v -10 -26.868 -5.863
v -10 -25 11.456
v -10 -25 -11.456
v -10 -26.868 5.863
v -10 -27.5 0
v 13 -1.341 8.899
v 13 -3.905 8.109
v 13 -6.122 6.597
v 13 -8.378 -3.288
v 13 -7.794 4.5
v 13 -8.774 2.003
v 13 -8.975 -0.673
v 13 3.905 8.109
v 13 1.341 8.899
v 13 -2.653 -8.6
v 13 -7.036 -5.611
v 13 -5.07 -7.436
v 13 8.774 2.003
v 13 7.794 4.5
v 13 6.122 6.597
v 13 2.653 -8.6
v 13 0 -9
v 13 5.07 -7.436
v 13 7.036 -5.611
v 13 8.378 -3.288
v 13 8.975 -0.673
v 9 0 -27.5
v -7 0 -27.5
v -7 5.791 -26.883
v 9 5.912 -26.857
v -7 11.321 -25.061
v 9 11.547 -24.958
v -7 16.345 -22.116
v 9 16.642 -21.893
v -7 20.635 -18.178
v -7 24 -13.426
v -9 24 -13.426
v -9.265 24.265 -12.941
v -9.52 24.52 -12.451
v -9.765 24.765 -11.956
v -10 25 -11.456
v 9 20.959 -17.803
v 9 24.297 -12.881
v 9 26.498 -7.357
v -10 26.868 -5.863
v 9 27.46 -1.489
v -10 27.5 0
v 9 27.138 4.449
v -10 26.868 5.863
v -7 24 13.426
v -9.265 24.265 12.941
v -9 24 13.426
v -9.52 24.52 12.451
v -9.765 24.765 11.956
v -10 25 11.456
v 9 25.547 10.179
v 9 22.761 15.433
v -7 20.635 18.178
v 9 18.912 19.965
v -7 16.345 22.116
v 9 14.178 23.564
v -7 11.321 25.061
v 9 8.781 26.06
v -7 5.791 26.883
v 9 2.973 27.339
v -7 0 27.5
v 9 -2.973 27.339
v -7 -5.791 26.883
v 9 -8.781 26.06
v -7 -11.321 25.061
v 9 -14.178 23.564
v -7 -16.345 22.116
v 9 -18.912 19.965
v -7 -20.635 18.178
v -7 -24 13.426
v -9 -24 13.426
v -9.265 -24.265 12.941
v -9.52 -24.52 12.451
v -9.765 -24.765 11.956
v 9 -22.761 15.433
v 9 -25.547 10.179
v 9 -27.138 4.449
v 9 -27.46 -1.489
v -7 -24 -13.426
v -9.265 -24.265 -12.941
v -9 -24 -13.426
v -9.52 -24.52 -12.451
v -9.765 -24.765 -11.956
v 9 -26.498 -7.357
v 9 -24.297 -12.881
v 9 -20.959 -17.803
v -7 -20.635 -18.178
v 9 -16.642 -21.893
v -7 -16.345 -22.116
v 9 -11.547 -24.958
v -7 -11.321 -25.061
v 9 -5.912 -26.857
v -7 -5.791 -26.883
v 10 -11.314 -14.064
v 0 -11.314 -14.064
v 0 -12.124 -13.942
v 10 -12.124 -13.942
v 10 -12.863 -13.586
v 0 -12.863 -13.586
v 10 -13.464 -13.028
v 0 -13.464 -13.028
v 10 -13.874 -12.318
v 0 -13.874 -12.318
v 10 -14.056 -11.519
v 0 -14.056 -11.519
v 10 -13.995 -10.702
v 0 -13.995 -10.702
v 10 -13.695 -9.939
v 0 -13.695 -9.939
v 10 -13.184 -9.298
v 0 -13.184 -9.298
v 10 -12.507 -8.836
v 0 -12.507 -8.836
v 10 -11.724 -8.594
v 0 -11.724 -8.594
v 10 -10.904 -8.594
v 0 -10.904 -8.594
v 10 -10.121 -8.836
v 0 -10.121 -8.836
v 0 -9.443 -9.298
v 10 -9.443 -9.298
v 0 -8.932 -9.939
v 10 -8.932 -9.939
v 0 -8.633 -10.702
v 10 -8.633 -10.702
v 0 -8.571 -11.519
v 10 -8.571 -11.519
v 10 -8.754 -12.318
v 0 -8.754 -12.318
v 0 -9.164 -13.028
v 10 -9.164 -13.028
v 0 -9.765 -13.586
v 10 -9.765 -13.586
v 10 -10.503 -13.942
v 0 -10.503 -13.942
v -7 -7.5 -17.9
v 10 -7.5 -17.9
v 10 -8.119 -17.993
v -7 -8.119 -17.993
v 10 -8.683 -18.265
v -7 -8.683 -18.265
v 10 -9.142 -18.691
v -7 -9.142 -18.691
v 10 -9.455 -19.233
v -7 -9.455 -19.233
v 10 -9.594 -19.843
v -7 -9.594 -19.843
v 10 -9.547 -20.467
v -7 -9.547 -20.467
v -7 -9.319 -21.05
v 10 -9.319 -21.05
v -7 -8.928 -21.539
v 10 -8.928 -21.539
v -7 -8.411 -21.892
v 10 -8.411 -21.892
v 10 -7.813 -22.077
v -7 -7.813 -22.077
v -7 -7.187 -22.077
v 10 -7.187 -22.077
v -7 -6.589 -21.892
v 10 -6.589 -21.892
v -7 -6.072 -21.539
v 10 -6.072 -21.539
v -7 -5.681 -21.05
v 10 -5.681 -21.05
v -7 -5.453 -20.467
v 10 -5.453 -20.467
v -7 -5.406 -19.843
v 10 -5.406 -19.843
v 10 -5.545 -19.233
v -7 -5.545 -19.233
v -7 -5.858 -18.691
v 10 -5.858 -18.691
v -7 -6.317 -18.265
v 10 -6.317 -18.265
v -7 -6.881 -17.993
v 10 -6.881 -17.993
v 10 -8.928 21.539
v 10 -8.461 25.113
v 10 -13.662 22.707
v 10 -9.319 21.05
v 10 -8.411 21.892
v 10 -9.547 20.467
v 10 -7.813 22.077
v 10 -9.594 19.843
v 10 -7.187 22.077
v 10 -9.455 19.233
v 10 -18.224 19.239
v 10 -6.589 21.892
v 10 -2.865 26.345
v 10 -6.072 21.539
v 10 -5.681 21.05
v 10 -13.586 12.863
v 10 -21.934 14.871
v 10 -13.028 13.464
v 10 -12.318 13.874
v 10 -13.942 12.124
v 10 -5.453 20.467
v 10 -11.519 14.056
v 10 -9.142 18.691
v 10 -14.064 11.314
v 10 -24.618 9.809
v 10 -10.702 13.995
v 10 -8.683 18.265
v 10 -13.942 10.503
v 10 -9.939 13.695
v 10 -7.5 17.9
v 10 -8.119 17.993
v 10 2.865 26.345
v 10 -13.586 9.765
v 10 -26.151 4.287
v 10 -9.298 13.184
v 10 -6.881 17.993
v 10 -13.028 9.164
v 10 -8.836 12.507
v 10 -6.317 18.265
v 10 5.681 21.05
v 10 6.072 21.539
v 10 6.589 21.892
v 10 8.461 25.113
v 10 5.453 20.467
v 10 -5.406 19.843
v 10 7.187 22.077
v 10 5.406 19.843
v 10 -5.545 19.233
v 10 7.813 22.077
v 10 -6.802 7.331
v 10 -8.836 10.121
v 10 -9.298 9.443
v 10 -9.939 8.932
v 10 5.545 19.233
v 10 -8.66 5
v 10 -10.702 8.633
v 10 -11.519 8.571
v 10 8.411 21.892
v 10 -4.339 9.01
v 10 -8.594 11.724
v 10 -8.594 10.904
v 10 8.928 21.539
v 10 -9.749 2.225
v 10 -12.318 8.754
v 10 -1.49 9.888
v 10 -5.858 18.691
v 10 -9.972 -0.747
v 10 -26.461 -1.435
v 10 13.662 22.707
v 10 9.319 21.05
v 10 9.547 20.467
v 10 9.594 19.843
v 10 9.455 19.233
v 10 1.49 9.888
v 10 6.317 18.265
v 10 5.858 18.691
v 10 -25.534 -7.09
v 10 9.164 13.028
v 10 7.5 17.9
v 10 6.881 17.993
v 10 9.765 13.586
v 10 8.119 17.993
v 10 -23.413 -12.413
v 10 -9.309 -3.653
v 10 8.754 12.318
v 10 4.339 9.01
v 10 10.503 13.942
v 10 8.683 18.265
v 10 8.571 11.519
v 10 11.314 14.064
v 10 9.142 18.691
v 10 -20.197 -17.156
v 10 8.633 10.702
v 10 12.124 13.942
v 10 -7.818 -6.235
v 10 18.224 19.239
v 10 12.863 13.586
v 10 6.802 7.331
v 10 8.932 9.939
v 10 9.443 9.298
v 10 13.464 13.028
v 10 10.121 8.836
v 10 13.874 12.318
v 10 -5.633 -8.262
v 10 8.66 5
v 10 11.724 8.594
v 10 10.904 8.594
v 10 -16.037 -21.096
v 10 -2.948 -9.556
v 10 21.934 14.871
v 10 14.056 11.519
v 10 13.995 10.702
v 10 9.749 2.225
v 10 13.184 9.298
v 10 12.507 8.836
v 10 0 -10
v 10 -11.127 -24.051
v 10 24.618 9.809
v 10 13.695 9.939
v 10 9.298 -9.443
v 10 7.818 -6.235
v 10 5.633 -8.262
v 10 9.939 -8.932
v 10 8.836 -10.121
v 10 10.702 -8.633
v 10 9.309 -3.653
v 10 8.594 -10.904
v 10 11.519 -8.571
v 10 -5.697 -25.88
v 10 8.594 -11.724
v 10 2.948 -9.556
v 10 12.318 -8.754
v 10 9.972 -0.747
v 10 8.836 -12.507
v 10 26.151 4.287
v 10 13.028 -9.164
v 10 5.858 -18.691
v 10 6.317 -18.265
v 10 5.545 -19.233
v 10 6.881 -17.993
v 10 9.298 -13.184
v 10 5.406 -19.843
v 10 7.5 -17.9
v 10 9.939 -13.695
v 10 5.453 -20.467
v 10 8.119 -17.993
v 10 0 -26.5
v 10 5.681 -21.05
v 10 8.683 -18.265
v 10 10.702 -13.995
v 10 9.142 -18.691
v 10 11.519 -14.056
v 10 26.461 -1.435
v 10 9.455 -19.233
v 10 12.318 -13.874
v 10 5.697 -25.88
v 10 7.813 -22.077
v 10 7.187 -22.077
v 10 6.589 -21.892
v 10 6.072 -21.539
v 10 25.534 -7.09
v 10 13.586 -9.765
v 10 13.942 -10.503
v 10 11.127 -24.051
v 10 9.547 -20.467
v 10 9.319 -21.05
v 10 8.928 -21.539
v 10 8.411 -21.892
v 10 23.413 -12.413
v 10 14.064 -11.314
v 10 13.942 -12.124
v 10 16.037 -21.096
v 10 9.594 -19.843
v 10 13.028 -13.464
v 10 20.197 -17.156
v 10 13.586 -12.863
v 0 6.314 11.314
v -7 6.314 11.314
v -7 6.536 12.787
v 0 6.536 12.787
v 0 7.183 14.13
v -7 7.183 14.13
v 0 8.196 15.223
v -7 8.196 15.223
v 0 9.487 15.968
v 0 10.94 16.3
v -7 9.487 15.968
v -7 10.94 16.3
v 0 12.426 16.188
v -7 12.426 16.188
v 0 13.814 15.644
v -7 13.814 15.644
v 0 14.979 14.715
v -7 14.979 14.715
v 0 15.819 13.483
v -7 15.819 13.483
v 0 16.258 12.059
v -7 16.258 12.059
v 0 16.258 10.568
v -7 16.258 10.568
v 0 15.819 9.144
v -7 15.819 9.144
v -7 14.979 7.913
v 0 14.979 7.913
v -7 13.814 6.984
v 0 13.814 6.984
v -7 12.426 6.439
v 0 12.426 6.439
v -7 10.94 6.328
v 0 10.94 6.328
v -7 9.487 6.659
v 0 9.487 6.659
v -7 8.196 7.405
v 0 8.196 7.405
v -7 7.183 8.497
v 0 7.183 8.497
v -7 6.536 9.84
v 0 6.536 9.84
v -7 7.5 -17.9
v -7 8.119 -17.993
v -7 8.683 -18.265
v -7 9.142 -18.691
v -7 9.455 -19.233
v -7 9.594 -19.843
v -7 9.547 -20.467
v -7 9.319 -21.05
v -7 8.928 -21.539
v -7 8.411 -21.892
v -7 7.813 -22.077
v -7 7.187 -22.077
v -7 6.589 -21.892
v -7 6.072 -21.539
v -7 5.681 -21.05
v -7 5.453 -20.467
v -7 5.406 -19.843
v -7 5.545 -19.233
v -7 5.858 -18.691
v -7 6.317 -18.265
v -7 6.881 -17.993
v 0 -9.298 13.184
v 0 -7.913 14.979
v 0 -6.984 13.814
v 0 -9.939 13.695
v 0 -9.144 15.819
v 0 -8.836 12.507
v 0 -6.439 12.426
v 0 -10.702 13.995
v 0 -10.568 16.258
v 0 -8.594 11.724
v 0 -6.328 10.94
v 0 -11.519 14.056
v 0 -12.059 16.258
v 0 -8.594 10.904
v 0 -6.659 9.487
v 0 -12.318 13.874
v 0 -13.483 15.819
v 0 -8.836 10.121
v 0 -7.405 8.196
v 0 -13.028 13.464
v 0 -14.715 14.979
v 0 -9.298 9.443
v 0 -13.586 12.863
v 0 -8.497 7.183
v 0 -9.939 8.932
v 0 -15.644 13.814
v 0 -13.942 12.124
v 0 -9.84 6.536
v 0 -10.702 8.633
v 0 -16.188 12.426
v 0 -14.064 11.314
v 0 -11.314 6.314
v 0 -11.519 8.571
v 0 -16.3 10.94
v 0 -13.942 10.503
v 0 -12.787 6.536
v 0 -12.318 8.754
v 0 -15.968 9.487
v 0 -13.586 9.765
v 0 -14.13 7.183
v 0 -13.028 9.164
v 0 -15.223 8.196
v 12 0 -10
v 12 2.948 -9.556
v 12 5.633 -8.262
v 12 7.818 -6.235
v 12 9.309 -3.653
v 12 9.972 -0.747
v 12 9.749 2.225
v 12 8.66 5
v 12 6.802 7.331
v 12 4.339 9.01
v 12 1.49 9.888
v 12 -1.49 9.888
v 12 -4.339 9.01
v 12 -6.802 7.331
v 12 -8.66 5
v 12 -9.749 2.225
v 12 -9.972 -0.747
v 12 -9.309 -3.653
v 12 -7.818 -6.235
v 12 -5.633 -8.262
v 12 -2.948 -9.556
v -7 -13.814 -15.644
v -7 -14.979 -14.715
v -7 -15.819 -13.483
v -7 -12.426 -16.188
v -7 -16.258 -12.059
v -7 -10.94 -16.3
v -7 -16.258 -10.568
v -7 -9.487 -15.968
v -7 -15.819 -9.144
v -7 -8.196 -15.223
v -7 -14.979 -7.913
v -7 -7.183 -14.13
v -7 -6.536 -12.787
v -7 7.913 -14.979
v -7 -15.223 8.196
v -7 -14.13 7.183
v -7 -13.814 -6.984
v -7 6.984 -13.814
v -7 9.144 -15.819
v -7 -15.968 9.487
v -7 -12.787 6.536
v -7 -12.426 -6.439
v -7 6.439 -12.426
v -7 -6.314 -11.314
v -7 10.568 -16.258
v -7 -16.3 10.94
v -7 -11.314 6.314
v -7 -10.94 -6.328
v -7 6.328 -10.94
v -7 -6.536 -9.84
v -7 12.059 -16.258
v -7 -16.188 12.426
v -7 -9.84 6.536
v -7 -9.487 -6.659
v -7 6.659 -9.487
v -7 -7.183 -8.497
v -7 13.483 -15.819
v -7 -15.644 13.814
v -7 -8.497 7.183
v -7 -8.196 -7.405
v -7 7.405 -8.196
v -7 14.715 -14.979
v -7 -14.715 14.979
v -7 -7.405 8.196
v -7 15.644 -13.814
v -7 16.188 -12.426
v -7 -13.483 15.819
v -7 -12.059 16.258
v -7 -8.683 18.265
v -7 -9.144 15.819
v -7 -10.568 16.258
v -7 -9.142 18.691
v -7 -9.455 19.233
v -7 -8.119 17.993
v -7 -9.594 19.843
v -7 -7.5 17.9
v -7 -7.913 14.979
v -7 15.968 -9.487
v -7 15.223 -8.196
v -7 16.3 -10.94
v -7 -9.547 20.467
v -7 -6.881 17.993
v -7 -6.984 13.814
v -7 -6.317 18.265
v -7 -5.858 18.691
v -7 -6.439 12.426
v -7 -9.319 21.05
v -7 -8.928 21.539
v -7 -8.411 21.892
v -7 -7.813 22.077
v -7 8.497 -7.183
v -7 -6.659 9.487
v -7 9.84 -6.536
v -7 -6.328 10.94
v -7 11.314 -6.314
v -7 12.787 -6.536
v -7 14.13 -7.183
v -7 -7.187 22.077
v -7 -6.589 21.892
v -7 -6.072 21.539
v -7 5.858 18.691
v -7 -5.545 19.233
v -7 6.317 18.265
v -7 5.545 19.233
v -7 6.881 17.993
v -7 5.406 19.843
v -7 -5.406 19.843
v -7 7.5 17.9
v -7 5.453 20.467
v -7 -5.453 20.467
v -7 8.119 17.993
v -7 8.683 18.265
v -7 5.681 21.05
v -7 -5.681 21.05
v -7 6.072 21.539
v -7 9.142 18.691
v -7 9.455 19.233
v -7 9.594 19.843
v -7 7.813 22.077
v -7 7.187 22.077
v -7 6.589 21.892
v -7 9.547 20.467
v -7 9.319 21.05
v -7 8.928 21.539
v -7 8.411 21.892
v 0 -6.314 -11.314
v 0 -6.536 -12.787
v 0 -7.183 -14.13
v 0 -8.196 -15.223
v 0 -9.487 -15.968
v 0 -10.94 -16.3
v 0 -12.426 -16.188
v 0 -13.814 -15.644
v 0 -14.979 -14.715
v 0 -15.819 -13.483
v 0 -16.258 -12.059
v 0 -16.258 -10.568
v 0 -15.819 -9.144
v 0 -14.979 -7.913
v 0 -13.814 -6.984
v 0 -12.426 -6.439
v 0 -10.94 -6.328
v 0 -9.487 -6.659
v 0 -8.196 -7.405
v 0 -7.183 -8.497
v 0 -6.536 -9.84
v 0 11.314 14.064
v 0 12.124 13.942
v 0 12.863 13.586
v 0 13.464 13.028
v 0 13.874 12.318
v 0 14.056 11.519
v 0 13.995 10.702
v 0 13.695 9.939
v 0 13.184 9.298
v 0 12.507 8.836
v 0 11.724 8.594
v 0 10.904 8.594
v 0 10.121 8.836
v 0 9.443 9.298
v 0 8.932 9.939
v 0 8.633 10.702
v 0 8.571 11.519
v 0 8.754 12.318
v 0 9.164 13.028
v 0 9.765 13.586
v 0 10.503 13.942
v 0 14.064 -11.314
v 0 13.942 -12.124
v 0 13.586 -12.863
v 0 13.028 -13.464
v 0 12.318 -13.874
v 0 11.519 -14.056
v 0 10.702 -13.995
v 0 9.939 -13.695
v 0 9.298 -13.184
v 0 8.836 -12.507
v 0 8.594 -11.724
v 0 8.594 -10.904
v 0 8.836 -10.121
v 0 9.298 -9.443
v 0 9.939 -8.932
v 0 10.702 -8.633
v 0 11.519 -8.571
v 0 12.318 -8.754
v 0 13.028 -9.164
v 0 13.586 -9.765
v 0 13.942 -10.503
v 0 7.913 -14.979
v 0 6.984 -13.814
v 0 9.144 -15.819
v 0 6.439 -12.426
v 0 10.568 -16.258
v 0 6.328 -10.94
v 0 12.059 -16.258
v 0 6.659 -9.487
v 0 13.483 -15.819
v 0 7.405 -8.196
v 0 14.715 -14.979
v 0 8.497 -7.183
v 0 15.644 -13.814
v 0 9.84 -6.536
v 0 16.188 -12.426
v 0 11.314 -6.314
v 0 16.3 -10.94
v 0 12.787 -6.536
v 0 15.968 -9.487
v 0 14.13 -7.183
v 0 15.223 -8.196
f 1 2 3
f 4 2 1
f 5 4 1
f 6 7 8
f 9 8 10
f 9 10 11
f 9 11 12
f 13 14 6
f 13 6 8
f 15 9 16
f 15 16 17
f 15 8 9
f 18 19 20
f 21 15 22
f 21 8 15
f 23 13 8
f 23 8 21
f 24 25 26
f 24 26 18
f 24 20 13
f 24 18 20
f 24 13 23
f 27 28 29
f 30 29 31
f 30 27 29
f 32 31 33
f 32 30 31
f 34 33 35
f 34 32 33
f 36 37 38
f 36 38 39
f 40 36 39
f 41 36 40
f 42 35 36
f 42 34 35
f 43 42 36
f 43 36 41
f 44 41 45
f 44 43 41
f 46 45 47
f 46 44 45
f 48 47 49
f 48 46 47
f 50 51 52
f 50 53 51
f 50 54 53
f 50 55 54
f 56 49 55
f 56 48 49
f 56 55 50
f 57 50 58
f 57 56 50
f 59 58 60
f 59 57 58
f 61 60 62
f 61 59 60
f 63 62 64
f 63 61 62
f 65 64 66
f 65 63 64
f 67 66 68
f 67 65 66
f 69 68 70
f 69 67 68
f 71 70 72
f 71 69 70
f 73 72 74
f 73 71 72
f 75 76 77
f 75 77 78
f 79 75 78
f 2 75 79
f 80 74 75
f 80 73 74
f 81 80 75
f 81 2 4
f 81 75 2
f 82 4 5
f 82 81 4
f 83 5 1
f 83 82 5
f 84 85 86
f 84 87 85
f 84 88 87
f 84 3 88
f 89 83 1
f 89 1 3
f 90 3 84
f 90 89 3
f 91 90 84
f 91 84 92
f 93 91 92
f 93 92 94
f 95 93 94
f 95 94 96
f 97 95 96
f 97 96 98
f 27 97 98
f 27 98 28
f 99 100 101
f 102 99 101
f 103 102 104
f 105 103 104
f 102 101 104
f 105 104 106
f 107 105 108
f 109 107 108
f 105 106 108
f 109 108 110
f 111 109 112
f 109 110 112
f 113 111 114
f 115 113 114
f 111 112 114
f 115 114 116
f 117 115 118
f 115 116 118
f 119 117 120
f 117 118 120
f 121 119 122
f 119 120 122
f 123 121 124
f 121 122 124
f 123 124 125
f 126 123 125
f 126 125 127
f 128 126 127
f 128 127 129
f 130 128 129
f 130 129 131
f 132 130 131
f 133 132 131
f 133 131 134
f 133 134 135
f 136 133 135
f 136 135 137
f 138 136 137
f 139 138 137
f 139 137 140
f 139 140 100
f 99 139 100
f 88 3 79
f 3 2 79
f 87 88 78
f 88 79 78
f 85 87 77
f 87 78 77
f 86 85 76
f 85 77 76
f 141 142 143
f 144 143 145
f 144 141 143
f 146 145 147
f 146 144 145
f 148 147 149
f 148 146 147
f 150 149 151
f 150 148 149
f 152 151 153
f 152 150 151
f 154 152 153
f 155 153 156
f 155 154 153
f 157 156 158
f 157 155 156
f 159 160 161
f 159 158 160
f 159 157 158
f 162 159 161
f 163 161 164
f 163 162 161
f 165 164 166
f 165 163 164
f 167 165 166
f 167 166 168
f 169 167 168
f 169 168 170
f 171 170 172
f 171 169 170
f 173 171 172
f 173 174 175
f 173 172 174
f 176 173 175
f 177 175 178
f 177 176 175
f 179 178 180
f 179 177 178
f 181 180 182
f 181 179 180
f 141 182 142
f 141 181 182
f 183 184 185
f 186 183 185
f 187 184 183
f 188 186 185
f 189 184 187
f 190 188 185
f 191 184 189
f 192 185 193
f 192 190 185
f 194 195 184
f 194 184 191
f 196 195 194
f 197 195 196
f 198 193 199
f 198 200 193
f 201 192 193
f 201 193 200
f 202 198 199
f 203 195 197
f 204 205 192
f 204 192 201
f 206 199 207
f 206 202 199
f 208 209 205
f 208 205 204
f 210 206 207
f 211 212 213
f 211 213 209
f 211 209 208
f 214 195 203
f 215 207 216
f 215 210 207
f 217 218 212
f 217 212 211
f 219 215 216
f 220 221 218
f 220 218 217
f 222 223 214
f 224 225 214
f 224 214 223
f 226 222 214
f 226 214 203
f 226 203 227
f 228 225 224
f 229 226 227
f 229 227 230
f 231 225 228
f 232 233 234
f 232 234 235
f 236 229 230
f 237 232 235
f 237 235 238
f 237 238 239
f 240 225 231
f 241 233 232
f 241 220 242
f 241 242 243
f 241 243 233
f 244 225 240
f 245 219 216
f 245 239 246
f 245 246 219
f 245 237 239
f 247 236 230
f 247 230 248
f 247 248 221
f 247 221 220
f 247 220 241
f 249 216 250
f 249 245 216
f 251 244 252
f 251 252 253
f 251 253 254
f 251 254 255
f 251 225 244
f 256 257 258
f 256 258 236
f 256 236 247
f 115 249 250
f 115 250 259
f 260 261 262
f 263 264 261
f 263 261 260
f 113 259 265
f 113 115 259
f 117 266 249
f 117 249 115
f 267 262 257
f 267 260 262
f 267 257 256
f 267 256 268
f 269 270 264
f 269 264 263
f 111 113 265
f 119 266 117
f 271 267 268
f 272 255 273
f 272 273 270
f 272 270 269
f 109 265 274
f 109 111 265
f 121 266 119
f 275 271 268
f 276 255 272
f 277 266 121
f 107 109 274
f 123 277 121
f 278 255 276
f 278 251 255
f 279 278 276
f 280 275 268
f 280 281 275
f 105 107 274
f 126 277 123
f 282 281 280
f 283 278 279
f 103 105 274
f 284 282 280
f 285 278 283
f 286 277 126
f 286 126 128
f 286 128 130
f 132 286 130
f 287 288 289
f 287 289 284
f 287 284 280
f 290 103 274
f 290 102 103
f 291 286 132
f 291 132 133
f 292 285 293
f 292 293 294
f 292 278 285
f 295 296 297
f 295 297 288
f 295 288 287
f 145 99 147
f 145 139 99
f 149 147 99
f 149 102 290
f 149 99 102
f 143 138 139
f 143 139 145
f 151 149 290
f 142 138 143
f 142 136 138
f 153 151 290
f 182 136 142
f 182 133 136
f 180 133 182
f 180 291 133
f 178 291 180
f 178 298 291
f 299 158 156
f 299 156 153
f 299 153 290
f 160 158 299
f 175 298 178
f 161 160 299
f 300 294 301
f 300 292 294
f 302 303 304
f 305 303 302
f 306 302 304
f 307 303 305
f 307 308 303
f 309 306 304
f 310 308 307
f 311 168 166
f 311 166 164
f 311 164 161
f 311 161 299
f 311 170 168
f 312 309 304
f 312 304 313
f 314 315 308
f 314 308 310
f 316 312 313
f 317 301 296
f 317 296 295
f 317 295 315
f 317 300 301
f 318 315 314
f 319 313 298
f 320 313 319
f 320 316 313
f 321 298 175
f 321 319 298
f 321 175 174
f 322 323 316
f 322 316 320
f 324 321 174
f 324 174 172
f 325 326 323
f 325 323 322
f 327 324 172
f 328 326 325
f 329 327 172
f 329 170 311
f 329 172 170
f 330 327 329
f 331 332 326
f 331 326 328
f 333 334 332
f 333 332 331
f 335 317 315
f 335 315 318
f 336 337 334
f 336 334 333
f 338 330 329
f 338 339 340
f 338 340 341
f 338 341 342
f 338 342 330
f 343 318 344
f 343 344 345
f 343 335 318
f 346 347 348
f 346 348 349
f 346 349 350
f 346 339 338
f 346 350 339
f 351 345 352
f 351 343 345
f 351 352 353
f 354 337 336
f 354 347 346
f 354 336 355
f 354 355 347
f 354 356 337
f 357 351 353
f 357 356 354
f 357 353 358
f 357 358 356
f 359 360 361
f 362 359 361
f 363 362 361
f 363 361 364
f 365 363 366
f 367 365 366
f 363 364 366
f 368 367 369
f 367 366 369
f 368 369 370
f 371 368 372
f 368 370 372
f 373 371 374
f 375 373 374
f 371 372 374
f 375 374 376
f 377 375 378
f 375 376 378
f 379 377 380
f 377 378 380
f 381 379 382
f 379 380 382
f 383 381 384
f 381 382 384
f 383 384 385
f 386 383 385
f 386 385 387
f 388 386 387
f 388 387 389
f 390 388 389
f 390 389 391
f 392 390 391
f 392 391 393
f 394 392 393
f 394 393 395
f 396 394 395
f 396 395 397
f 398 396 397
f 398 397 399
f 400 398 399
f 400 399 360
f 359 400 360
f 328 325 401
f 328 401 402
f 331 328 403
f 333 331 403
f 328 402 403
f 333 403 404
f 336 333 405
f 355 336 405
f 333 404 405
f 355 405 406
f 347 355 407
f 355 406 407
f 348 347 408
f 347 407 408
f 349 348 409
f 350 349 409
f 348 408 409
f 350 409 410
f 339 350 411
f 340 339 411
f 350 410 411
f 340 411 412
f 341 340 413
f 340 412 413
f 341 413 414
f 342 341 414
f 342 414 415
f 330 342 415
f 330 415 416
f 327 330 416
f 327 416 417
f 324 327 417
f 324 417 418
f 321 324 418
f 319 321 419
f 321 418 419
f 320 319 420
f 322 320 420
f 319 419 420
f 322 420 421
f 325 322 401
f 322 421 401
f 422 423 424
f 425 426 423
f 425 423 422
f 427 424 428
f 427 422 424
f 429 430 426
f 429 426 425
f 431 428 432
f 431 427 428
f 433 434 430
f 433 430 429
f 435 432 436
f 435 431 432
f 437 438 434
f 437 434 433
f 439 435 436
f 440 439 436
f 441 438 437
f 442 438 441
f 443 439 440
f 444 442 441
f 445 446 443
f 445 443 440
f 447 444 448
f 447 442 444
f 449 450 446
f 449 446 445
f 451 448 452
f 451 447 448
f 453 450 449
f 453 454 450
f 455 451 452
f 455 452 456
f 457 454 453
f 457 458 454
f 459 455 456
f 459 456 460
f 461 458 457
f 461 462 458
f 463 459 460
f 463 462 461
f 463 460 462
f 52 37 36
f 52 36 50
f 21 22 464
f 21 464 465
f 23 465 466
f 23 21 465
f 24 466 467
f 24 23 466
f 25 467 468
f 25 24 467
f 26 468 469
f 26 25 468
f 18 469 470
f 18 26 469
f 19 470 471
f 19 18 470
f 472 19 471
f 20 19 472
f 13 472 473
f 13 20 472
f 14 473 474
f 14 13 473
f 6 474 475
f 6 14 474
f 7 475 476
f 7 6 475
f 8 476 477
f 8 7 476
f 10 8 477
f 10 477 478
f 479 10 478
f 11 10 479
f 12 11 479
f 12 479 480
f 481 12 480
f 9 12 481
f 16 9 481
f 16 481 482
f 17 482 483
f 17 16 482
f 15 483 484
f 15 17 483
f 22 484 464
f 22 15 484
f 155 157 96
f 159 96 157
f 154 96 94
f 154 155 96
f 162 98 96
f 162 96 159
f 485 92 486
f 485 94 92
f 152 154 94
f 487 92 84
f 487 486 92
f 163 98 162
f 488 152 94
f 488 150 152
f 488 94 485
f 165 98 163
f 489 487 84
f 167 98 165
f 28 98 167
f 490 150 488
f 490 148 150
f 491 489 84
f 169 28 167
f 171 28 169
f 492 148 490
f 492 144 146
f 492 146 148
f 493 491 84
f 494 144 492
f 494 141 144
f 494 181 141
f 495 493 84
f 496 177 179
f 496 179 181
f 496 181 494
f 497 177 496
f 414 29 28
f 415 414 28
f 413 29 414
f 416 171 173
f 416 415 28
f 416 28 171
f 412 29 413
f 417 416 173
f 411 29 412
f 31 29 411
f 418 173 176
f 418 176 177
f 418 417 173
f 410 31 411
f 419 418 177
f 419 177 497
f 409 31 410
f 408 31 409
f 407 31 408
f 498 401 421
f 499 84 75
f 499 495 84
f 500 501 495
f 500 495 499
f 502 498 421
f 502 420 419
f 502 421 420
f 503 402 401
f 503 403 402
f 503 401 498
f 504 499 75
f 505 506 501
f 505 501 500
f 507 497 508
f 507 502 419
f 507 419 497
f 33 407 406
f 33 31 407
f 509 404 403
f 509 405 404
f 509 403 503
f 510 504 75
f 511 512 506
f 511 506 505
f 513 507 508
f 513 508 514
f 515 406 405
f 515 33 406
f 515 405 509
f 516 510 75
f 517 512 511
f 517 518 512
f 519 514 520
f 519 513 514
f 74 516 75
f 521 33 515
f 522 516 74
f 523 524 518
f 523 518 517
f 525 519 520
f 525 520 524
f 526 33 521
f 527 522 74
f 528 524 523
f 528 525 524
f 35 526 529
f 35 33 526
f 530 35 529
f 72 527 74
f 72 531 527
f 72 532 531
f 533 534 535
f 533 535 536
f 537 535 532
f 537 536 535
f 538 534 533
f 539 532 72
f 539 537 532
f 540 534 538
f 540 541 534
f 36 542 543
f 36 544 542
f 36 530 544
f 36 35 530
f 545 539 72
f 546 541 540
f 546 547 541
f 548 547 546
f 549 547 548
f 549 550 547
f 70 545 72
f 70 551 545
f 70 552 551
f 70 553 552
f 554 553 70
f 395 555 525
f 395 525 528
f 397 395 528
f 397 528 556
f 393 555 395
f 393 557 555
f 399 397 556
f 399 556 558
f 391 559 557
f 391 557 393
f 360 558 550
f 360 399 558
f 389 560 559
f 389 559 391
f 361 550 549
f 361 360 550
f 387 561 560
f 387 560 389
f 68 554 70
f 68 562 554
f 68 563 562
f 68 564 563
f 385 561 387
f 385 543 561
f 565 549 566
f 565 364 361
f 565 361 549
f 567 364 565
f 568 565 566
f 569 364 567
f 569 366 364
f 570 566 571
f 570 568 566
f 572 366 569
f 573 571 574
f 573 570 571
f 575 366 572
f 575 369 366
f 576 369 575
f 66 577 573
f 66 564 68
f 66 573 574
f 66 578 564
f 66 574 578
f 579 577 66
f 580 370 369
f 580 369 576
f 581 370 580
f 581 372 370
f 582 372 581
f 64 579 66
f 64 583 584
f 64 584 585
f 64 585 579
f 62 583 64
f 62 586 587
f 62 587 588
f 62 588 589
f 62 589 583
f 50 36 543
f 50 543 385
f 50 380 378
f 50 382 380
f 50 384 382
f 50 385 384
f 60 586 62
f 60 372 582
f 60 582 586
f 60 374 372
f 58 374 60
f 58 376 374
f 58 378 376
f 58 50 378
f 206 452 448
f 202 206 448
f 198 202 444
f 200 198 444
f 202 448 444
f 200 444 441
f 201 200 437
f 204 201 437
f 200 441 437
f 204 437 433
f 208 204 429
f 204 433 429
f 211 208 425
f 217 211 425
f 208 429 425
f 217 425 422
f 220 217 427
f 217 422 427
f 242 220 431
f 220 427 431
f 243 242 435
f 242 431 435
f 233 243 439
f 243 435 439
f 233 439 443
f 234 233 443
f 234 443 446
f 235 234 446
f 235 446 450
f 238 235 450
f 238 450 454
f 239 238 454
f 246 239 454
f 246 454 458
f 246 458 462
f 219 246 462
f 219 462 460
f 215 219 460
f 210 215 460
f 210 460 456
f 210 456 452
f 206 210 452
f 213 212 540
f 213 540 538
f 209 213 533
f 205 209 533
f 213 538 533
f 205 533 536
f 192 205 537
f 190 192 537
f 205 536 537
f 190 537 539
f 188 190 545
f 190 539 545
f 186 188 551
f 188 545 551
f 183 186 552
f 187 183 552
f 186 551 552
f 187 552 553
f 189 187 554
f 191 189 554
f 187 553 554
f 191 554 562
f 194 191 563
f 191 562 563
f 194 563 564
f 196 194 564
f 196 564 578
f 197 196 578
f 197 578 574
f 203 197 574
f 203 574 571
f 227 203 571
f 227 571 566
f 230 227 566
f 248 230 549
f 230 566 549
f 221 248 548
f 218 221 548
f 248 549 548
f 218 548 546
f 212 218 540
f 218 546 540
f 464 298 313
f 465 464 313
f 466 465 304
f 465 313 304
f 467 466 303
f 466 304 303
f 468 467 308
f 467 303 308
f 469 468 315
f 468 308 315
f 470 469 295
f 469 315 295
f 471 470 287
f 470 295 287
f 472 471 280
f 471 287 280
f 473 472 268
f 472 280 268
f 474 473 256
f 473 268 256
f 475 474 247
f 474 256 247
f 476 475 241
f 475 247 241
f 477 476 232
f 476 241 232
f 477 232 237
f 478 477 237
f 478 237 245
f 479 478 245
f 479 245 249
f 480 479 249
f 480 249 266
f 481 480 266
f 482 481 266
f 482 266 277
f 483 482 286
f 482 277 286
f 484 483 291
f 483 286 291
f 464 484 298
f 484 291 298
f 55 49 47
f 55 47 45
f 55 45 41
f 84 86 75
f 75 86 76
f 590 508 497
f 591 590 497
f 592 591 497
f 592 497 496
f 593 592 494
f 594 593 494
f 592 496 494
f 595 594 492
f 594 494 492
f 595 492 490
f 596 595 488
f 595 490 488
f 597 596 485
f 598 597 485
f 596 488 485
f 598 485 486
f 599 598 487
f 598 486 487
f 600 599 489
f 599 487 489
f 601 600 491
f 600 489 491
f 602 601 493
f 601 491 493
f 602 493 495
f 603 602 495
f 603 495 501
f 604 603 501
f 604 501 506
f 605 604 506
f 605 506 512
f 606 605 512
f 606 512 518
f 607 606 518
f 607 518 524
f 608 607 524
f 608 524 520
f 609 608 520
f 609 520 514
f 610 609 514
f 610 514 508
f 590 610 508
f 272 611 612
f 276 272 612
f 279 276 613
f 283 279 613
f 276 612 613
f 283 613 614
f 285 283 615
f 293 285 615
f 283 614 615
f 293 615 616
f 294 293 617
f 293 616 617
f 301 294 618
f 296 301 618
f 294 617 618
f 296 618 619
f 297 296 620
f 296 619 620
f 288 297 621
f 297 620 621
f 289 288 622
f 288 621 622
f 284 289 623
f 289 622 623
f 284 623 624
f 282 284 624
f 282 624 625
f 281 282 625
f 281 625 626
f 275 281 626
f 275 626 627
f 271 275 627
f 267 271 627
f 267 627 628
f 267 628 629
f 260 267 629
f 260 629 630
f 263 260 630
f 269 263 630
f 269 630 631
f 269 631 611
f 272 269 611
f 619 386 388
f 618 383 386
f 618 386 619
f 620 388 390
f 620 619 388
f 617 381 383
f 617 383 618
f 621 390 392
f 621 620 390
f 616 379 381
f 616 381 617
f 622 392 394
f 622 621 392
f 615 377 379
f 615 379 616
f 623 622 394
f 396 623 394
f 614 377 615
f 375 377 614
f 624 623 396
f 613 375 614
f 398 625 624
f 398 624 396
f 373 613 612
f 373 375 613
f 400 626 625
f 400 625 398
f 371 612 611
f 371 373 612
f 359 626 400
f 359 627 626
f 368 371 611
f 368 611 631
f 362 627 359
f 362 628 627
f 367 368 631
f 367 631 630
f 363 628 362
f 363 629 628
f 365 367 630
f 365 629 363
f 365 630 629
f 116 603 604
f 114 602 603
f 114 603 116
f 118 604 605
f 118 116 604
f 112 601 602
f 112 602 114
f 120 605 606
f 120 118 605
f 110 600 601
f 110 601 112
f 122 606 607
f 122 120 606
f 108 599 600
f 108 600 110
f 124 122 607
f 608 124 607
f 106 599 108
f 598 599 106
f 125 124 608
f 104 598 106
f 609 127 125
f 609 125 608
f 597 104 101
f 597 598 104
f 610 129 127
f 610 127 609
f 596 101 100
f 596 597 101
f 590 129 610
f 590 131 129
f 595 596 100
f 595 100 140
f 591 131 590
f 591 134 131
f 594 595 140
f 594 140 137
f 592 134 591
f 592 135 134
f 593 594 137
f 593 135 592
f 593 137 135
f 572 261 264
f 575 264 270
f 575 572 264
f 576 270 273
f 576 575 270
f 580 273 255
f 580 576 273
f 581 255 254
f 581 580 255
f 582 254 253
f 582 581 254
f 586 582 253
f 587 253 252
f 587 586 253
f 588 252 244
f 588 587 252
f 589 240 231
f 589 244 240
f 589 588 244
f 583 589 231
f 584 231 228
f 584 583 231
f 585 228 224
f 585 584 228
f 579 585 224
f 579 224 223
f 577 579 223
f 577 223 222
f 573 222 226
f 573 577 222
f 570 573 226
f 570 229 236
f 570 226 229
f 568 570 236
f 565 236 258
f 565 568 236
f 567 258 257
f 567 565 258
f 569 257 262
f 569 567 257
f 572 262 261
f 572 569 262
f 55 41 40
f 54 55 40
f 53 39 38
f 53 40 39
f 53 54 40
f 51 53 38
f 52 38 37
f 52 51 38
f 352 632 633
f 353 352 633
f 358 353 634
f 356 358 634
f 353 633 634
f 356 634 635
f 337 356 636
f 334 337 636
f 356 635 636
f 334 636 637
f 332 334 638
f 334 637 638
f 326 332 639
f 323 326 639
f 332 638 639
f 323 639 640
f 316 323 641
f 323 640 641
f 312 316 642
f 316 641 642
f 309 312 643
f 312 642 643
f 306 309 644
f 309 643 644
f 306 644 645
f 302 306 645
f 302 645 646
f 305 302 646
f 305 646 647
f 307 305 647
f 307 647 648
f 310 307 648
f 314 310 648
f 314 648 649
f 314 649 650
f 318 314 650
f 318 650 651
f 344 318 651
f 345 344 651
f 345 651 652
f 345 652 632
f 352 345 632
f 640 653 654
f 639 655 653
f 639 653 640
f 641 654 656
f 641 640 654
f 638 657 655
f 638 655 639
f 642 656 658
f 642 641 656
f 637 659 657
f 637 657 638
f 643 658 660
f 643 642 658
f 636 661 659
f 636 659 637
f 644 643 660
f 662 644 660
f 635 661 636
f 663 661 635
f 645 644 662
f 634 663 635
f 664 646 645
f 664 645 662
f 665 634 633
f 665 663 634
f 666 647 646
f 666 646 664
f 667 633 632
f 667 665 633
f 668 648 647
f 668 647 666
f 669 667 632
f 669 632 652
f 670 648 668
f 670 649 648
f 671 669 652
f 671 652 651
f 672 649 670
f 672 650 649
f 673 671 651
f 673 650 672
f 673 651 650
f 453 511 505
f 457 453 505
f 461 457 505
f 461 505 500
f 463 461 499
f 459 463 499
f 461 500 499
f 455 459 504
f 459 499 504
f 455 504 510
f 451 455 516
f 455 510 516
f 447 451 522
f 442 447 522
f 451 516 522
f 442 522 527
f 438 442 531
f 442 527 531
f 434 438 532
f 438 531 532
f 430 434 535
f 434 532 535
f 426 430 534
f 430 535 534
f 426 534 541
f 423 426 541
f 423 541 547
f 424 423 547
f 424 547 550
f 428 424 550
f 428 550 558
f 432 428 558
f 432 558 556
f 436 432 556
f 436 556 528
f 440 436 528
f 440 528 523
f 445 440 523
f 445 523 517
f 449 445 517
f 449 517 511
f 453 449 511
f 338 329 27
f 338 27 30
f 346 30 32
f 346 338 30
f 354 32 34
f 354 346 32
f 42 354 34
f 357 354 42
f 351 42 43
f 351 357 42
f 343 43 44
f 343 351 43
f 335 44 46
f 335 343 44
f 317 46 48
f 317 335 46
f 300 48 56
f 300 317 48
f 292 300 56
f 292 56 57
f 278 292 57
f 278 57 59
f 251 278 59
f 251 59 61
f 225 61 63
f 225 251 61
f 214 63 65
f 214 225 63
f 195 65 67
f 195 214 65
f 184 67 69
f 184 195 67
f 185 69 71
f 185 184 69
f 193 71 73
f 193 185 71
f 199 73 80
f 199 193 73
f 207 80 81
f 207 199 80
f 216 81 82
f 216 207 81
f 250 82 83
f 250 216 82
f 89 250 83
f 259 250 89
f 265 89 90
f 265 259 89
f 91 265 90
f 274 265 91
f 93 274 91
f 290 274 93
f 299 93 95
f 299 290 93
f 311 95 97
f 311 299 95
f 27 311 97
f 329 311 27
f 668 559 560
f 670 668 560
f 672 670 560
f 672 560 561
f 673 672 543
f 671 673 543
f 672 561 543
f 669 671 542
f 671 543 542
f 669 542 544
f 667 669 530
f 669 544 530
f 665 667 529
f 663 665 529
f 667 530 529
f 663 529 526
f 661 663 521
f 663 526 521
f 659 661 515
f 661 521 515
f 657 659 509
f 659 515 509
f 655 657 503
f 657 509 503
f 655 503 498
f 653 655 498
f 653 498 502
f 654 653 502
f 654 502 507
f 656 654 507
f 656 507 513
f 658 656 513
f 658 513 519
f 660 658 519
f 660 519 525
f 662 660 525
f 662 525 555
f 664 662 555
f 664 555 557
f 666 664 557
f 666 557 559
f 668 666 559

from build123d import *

# Parameters (mm, degrees)
SKETCH_1_R               = 27.5
EXTRUDE_1_DEPTH          = 10
SKETCH_2_R               = 10
EXTRUDE_2_DEPTH          = 3
SKETCH_3_R               = 2.75
CUT_EXTRUDE_1_DEPTH      = 30
PATTERN_CIRCULAR_1_COUNT = 4
SKETCH_4_R               = 5
CUT_EXTRUDE_2_DEPTH      = 10
PATTERN_CIRCULAR_2_COUNT = 4
SKETCH_5_W               = 66.473755295
SKETCH_5_H               = 48
CUT_EXTRUDE_3_DEPTH      = 3
CHAMFER_1_SIZE           = 1
CHAMFER_2_SIZE           = 1


with BuildPart() as part:
    # 草图1 → 凸台-拉伸1 (new, symmetric)
    with BuildSketch(Plane(origin=(0, 0, 0), x_dir=(0, 0, -1), z_dir=(1, 0, 0))):
        Circle(SKETCH_1_R)
    extrude(amount=EXTRUDE_1_DEPTH, both=True)

    # 草图2 → 凸台-拉伸2 (add)
    with BuildSketch(Plane(origin=(10, 0, 0), x_dir=(0, 0, -1), z_dir=(1, 0, 0))):
        Circle(SKETCH_2_R)
    extrude(amount=EXTRUDE_2_DEPTH)

    # 草图3 → 切除-拉伸1 (cut)
    with BuildSketch(Plane.ZY.offset(10)):
        with Locations((11.313708499, 11.313708499)):
            Circle(SKETCH_3_R)
    cut_extrude_1 = extrude(amount=-CUT_EXTRUDE_1_DEPTH, mode=Mode.SUBTRACT)

    # 阵列(圆周)1: 切除-拉伸1 ×4 about axis
    pattern_circular_1_axis = Axis((0, 0, 0), (1, 0, 0))
    for i in range(1, PATTERN_CIRCULAR_1_COUNT):
        add(cut_extrude_1.rotate(pattern_circular_1_axis, i * 360 / PATTERN_CIRCULAR_1_COUNT), mode=Mode.SUBTRACT)

    # 草图4 → 切除-拉伸2 (cut)
    with BuildSketch(Plane.ZY.offset(10)):
        with Locations((-11.313708499, 11.313708499)):
            Circle(SKETCH_4_R)
    cut_extrude_2 = extrude(amount=-CUT_EXTRUDE_2_DEPTH, mode=Mode.SUBTRACT)

    # 阵列(圆周)2: 切除-拉伸2 ×4 about axis
    pattern_circular_2_axis = Axis((0, 0, 0), (1, 0, 0))
    for i in range(1, PATTERN_CIRCULAR_2_COUNT):
        add(cut_extrude_2.rotate(pattern_circular_2_axis, i * 360 / PATTERN_CIRCULAR_2_COUNT), mode=Mode.SUBTRACT)

    # 草图5 → 切除-拉伸3 (cut)
    with BuildSketch(Plane.ZY.offset(10)):
        with Locations((4.248104101, 0)):
            Rectangle(SKETCH_5_W, SKETCH_5_H)
    extrude(amount=-CUT_EXTRUDE_3_DEPTH, mode=Mode.SUBTRACT)

    # 倒角1
    chamfer_1_edges = [part.edges().sort_by_distance(p)[0] for p in [
        (-10, 24, 0),
        (-10, -24, 0),
    ]]
    chamfer(chamfer_1_edges, length=CHAMFER_1_SIZE)

    # 倒角2
    chamfer_2_edges = [part.edges().sort_by_distance(p)[0] for p in [
        (10, 0, 27.5),
        (13, 0, 10),
    ]]
    chamfer(chamfer_2_edges, length=CHAMFER_2_SIZE)

    # 草图6 → M5 螺纹孔1 (revolve, cut)
    with BuildSketch(Plane(origin=(-7, -7.5, -20), x_dir=(0, 0, 1), z_dir=(0, 1, 0))):
        Polygon((0, 0), (0, 33.6618073), (2.1, 32.4), (2.1, 0), align=None)
    hole_wizard_m5_1 = revolve(axis=Axis((-13.35, -7.5, -20), (1, 0, 0)), mode=Mode.SUBTRACT)

    # 镜向1: M5 螺纹孔1 across plane
    add(hole_wizard_m5_1.mirror(Plane.ZX), mode=Mode.SUBTRACT)

    # 镜向2: M5 螺纹孔1 across plane
    add(hole_wizard_m5_1.mirror(Plane.XY), mode=Mode.SUBTRACT)

    # 镜向2 copy 1 sketch → 镜向2 copy 1 (revolve, cut)
    with BuildSketch(Plane(origin=(-7, 7.5, 20), x_dir=(0, 0, -1), z_dir=(0, -1, 0))):
        Polygon((0, 0), (0, 33.6618073), (2.1, 32.4), (2.1, 0), align=None)
    revolve(axis=Axis((-13.35, 7.5, 20), (1, 0, 0)), mode=Mode.SUBTRACT)


solid = part.part
